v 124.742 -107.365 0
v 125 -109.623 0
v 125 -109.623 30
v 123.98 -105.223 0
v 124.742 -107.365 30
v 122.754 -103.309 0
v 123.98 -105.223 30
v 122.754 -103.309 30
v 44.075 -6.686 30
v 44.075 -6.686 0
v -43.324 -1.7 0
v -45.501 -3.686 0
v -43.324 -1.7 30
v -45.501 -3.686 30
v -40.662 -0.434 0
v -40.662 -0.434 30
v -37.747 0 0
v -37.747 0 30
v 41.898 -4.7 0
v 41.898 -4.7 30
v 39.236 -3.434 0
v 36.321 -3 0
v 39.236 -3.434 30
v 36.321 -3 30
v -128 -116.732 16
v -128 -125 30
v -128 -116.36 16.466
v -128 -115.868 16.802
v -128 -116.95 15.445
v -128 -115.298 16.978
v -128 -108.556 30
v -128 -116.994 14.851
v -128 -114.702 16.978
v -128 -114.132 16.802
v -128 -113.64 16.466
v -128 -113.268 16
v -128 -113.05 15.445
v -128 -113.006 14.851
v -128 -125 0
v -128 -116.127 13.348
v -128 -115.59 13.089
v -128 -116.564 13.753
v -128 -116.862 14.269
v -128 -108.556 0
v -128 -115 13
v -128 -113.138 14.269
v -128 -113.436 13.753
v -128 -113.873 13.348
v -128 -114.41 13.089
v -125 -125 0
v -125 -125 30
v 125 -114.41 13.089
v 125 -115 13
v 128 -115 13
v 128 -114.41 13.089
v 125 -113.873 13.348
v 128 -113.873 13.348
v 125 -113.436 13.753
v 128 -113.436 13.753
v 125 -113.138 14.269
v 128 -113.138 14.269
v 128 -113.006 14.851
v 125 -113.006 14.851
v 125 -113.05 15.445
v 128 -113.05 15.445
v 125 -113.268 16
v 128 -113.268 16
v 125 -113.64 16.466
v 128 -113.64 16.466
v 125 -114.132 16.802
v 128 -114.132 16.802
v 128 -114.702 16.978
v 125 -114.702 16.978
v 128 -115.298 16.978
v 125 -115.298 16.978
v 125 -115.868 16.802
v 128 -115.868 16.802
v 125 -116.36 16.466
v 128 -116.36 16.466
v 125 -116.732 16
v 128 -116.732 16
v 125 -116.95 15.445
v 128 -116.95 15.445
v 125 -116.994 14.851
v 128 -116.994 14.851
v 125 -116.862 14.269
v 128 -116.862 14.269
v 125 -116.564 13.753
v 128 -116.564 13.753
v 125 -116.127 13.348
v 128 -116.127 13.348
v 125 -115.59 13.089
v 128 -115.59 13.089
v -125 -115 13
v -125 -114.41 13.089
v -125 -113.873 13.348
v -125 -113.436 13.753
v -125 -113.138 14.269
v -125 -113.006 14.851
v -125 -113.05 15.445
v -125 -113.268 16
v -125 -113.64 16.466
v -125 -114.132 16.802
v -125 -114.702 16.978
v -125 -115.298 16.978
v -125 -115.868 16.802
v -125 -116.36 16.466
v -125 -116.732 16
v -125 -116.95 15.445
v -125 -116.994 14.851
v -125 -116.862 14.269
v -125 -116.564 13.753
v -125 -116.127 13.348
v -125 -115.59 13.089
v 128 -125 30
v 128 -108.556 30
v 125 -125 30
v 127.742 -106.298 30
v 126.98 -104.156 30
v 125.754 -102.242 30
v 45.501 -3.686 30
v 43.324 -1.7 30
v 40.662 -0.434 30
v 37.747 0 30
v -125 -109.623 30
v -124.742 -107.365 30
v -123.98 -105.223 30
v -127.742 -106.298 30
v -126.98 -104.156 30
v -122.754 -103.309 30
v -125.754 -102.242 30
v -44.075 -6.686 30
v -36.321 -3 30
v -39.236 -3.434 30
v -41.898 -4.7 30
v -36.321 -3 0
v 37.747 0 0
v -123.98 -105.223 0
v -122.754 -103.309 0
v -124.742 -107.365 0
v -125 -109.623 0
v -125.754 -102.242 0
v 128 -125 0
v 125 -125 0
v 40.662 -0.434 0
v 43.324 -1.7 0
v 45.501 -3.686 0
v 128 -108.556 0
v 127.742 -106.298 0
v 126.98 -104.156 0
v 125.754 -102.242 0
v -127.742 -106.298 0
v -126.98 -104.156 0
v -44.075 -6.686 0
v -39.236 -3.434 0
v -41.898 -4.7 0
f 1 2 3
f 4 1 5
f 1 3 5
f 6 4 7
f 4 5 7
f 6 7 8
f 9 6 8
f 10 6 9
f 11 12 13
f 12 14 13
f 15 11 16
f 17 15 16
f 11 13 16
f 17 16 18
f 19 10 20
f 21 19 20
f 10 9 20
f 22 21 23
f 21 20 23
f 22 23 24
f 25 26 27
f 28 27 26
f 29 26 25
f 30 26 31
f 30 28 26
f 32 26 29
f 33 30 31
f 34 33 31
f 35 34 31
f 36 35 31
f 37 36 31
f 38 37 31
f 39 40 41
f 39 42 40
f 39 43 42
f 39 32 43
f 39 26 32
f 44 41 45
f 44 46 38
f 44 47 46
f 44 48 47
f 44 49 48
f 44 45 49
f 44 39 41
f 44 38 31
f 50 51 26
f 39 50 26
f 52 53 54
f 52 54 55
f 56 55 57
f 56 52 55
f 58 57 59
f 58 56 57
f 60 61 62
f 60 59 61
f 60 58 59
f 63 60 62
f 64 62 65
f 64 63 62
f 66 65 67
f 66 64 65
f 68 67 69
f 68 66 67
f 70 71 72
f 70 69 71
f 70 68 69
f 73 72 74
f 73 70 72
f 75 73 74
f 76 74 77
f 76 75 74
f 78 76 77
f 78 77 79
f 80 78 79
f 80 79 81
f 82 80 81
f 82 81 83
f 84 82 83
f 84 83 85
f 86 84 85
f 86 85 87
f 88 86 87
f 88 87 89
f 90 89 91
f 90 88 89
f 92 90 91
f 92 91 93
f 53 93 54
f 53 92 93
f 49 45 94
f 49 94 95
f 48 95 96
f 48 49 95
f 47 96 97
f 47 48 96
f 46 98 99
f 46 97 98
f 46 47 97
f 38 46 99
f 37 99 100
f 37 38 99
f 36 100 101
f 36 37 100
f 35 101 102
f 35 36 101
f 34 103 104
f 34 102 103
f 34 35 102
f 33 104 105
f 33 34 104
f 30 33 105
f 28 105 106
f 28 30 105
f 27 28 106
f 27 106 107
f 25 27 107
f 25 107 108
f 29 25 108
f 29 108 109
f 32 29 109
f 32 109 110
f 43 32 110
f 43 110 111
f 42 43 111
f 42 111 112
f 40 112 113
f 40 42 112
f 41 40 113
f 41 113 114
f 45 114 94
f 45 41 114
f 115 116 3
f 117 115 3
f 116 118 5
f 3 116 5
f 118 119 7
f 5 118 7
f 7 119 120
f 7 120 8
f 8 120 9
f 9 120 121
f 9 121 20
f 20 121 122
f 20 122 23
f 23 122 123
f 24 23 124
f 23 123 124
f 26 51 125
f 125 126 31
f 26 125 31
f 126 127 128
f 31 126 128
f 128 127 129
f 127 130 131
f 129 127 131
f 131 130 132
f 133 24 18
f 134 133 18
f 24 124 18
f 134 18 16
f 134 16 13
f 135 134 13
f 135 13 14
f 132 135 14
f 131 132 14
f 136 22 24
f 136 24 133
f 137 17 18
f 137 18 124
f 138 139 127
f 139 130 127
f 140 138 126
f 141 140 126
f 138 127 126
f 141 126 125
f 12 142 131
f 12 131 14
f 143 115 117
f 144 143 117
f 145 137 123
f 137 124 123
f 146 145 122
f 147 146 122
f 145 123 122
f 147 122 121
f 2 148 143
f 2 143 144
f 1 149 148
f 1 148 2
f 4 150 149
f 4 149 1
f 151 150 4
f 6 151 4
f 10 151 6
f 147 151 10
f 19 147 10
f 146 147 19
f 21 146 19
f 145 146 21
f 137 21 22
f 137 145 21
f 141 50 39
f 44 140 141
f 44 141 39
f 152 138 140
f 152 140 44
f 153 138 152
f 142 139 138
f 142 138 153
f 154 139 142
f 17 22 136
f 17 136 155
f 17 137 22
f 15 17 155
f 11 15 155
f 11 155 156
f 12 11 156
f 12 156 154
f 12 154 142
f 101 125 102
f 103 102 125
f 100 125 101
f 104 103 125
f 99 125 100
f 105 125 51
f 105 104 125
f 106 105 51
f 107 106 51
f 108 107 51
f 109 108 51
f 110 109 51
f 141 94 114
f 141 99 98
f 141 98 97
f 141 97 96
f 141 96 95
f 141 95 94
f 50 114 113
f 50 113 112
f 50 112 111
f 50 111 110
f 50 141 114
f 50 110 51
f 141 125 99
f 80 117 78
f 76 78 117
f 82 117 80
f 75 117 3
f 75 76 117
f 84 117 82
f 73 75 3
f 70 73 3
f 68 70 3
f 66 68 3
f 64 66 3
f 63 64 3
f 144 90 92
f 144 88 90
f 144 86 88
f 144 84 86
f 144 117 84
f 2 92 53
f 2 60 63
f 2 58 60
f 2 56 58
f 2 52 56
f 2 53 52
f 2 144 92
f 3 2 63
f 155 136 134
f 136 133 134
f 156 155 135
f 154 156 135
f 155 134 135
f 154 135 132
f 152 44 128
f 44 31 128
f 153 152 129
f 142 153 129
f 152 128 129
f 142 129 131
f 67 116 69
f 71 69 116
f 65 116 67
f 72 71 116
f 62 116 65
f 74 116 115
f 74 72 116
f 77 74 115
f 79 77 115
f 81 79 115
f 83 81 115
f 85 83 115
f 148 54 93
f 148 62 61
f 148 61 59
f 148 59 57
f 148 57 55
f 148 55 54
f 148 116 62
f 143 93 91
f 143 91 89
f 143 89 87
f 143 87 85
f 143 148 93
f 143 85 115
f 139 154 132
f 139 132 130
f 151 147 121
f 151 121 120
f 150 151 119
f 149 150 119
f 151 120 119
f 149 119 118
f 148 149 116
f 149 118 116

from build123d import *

# Parameters (mm, degrees)
BOSS_EXTRUDE1_DEPTH     = 30
FILLET1_R               = 10
CUT_EXTRUDE1_DEPTH      = 287.462912085
CUT_EXTRUDE1_DEPTH_BACK = 287.462912085
SKETCH2_R               = 2


with BuildPart() as part:
    # Sketch1 → Boss-Extrude1 (new body)
    with BuildSketch(Plane.XY):
        Polygon((128, -125), (125, -125), (125, -106.066937462), (41.07406521, -3), (-41.07406521, -3), (-125, -106.066937462), (-125, -125), (-128, -125), (-128, -105), (-42.5, 0), (42.5, 0), (128, -105), align=None)
    extrude(amount=BOSS_EXTRUDE1_DEPTH)

    # Fillet1
    fillet1_edges = [part.edges().sort_by_distance(p)[0] for p in [
        (125, -106.066937462, 15),
        (41.07406521, -3, 15),
        (-41.07406521, -3, 15),
        (-125, -106.066937462, 15),
        (-128, -105, 15),
        (-42.5, 0, 15),
        (42.5, 0, 15),
        (128, -105, 15),
    ]]
    fillet(fillet1_edges, radius=FILLET1_R)

    # Sketch2 → Cut-Extrude1 (cut, two sides: drawn at the far end of the back side and taken through both)
    with BuildSketch(Plane(origin=(128, 0, 0), x_dir=(0, 0, -1), z_dir=(1, 0, 0)).offset(-CUT_EXTRUDE1_DEPTH_BACK)):
        with Locations((-15, -115)):
            Circle(SKETCH2_R)
    extrude(amount=CUT_EXTRUDE1_DEPTH + CUT_EXTRUDE1_DEPTH_BACK, mode=Mode.SUBTRACT)


solid = part.part
